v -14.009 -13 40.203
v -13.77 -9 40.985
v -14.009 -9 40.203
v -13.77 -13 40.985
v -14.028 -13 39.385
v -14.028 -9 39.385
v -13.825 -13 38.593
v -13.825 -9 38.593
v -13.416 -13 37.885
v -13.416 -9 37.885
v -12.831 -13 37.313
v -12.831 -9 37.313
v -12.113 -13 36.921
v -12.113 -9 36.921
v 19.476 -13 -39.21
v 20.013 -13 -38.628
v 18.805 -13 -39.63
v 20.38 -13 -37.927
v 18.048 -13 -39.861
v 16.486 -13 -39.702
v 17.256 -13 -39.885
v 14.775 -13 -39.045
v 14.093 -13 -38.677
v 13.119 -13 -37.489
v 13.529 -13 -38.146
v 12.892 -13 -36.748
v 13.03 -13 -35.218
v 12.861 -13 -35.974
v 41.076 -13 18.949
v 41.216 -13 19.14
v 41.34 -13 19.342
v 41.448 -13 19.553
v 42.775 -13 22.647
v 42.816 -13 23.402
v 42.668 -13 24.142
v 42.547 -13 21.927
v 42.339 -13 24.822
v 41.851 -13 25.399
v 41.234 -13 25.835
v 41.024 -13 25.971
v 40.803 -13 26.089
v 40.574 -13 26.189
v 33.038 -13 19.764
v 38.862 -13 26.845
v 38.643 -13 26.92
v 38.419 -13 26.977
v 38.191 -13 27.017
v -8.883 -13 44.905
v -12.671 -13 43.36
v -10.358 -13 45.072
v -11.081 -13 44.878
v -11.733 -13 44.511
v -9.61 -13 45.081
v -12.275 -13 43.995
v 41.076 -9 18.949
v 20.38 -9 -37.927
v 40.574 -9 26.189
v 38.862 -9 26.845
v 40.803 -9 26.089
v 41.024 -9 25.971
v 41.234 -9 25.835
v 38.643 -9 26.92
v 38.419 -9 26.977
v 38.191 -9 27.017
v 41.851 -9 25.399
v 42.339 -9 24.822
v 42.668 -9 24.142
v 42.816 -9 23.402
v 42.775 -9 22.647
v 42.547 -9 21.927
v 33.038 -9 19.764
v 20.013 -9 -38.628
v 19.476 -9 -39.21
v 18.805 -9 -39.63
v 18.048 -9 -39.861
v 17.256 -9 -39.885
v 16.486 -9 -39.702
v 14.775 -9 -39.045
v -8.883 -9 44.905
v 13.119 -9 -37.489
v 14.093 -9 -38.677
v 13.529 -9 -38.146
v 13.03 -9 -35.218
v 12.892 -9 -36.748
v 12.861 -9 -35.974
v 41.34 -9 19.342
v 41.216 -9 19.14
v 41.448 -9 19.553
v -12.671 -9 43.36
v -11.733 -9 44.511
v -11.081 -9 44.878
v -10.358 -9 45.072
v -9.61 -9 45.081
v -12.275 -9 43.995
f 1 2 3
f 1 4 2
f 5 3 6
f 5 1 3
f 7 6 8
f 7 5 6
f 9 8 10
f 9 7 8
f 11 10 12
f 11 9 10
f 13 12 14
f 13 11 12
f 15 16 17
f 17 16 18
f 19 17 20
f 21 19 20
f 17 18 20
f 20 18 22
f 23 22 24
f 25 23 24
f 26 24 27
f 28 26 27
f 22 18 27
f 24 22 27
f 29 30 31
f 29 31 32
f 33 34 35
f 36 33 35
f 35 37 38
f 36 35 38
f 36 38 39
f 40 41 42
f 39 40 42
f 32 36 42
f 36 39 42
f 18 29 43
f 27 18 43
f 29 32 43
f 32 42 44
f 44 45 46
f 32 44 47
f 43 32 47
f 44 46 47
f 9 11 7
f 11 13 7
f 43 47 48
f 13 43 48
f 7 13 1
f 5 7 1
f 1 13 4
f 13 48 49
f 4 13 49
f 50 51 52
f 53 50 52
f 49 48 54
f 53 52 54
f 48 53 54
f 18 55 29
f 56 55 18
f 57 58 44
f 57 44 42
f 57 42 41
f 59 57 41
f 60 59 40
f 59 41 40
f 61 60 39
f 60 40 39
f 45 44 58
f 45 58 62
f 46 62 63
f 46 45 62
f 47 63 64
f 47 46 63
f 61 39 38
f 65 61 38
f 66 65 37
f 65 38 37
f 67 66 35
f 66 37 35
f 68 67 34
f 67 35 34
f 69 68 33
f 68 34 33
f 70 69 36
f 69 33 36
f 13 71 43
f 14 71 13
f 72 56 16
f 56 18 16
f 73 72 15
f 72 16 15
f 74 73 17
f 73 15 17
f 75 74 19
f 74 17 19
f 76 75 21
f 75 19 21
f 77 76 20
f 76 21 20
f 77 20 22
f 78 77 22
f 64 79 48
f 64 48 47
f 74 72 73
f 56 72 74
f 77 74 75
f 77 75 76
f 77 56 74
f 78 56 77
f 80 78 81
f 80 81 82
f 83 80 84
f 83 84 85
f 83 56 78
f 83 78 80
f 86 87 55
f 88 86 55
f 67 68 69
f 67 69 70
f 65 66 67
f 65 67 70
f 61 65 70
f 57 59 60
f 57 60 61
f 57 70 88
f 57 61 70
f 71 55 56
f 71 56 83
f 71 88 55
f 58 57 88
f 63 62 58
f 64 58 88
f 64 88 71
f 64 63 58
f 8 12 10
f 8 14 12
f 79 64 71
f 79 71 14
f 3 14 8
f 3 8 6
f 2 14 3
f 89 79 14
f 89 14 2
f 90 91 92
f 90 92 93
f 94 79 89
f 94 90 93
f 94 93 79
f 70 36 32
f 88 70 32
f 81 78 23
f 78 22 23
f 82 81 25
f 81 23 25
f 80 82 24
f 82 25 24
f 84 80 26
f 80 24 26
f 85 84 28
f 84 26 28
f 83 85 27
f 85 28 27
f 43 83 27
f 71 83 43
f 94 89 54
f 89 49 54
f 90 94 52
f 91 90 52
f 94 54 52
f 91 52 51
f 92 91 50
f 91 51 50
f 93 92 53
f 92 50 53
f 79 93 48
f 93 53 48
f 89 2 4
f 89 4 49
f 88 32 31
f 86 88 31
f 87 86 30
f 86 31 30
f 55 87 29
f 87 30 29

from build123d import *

# Parameters (mm, degrees)
PAD005_DEPTH = 4
FILLET004_R  = 3
PAD006_DEPTH = 4
FILLET_R     = 3


with BuildPart() as fillet004:
    # Sketch010 → Pad005 (new body)
    with BuildSketch(Plane.XZ.offset(9)):
        Polygon((36.01236, 27.938416), (43.326587, 25.132718), (19.335825, -40.794858), (12.021599, -37.98916), align=None)
    extrude(amount=PAD005_DEPTH)

    # Fillet004
    fillet004_edges = [fillet004.edges().sort_by_distance(p)[0] for p in [
        (36.01236, -11, 27.938416),
        (43.326587, -11, 25.132718),
        (19.335825, -11, -40.794858),
        (12.021599, -11, -37.98916),
    ]]
    fillet(fillet004_edges, radius=FILLET004_R)


with BuildPart() as fusion009:
    # Sketch009 → Pad006 (new body)
    with BuildSketch(Plane.XZ.offset(9)):
        Polygon((-15.121457, 38.064293), (-11.496716, 45.897909), (43.898232, 24.848332), (40.273491, 17.014716), align=None)
    extrude(amount=PAD006_DEPTH)

    # Fillet
    fillet_edges = [fusion009.edges().sort_by_distance(p)[0] for p in [
        (-15.121457, -11, 38.064293),
        (-11.496716, -11, 45.897909),
        (43.898232, -11, 24.848332),
        (40.273491, -11, 17.014716),
    ]]
    fillet(fillet_edges, radius=FILLET_R)

    # Fusion009: union Fillet004
    add(fillet004.part)


solid = fusion009.part
